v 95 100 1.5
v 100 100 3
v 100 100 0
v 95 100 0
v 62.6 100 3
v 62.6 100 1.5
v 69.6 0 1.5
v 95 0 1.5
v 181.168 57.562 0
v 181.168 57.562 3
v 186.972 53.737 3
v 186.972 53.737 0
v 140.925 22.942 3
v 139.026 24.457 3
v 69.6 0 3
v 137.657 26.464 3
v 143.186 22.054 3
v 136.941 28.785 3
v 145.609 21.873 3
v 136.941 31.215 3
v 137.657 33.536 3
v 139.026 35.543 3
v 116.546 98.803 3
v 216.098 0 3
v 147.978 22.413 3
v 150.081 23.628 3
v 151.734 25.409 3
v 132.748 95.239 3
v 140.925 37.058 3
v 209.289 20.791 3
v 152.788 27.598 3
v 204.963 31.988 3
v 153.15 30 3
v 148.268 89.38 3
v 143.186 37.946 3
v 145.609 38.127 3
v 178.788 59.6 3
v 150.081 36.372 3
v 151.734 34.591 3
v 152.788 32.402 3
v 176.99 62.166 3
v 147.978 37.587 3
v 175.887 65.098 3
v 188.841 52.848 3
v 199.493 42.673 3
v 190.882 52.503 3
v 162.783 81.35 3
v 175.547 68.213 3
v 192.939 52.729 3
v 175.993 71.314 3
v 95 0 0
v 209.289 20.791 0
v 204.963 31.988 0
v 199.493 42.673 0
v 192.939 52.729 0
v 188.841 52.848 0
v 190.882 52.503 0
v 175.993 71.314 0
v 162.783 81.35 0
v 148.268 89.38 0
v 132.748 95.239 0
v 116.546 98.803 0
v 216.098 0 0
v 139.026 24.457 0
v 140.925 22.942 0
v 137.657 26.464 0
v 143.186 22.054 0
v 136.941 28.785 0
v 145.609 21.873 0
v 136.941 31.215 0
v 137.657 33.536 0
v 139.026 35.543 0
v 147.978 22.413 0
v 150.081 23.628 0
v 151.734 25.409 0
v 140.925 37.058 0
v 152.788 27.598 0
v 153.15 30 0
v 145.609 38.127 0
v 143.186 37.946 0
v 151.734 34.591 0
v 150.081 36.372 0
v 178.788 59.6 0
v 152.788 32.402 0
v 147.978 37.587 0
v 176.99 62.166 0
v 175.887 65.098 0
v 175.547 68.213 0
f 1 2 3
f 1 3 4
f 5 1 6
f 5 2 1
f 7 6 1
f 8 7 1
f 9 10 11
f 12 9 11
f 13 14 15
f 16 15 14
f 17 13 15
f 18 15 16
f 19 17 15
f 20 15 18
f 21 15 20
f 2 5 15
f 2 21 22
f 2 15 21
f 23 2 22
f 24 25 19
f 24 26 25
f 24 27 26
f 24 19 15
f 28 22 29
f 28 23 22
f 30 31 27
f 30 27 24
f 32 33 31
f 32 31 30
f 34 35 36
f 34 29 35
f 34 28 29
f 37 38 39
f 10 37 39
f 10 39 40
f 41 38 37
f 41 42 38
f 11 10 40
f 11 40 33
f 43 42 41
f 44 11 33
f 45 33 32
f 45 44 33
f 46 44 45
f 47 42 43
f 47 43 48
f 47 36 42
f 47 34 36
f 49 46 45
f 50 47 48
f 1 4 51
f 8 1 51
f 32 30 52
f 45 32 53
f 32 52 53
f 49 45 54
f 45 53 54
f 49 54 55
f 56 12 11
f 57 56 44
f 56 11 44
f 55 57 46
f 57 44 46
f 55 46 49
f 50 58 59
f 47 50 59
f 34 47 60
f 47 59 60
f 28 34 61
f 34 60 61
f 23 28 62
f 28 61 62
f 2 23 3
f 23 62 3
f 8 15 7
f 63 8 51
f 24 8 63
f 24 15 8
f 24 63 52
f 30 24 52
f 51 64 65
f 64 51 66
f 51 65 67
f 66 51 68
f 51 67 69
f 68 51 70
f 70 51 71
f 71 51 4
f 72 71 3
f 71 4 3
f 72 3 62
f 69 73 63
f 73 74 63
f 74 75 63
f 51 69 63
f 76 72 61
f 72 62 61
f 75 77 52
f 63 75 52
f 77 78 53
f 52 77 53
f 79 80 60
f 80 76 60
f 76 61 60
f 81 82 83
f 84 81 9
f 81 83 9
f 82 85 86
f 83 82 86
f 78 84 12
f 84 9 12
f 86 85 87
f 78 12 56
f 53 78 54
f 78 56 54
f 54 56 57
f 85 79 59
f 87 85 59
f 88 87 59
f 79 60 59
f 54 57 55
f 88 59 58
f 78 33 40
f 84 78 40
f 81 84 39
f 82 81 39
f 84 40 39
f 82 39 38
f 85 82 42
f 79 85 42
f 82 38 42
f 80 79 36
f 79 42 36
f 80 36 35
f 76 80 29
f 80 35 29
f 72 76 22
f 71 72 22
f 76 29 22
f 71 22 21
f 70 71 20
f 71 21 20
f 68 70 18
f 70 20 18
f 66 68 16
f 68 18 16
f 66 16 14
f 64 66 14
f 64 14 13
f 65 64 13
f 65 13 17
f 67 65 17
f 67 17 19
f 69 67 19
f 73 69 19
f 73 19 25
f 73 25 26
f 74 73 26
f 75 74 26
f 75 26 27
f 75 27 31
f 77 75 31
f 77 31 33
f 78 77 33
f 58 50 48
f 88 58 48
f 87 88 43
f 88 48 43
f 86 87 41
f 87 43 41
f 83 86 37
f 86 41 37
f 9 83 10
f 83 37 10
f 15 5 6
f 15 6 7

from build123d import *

# Parameters (mm, degrees)
F1_DEPTH  = 3
F3_DEPTH  = 25
F4_R      = 5
F5_R      = 11.15
F5_R_2    = 2.65
F6_DEPTH  = 25
F7_W      = 78
F7_H      = 55.5
F7_R      = 2
F8_DEPTH  = 25
F9_R      = 8.15
F10_DEPTH = 25
F12_W     = 307.7535755343
F12_H     = 117.255145081
F13_DEPTH = 25
F14_W     = 20
F14_H     = 100
F15_DEPTH = 1.5
F17_DEPTH = 1.5
F19_DEPTH = 25


with BuildPart() as f1:
    # F0 (on Top) → F1 (new body)
    with BuildSketch(Plane.XY):
        with BuildLine():
            Line((-197.8147600734, 20.7911690818), (-202.2340594865, 0))
            Line((-202.2340594865, 0), (216.0975214603, 0))
            Line((216.0975214603, 0), (209.2885731253, 20.7911690818))
            ThreePointArc((209.2885731253, 20.7911690818), (167.4870934164, 78.1154778874), (100, 100))
            Line((100, 100), (-100, 100))
            ThreePointArc((-100, 100), (-162.932039105, 77.7145961457), (-197.8147600734, 20.7911690818))
        make_face()
    extrude(amount=F1_DEPTH)

    # F2 (on face) → F3 (cut)
    with BuildSketch(Plane.XY.offset(3)):
        with BuildLine():
            ThreePointArc((1.5842979518, 0), (9.4530988092, 4.1693984068), (12.6, 12.5))
            ThreePointArc((12.6, 12.5), (12.2192388124, 15.5741182224), (11.0999678023, 18.4624420155))
            ThreePointArc((11.0999678023, 18.4624420155), (0, 25.1), (-11.0999678023, 18.4624420155))
            ThreePointArc((-11.0999678023, 18.4624420155), (-11.1999147641, 6.7274867453), (-1.5842979518, 0))
            Line((-1.5842979518, 0), (1.5842979518, 0))
        make_face()
        with BuildLine():
            ThreePointArc((11.0999678023, 18.4624420155), (12.2192388124, 15.5741182224), (12.6, 12.5))
            ThreePointArc((12.6, 12.5), (9.4530988092, 4.1693984068), (1.5842979518, 0))
            Line((1.5842979518, 0), (21.7592636698, 0))
            Line((21.7592636698, 0), (11.0999678023, 18.4624420155))
        make_face()
        with BuildLine():
            ThreePointArc((-1.5842979518, 0), (0, -0.1), (1.5842979518, 0))
            Line((1.5842979518, 0), (-1.5842979518, 0))
        make_face()
        with BuildLine():
            ThreePointArc((-1.5842979518, 0), (-11.1999147641, 6.7274867453), (-11.0999678023, 18.4624420155))
            Line((-11.0999678023, 18.4624420155), (-21.7592636698, 0))
            Line((-21.7592636698, 0), (-1.5842979518, 0))
        make_face()
    extrude(amount=-F3_DEPTH, mode=Mode.SUBTRACT)

    # F4
    f4_edges = [f1.edges().sort_by_distance(p)[0] for p in [
        (-21.759264, 0, 1.5),
        (21.759264, 0, 1.5),
    ]]
    fillet(f4_edges, radius=F4_R)

    # F5 (on face) → F6 (cut)
    with BuildSketch(Plane.XY.offset(3)):
        Polygon((-145, 38.9489291724), (-152.75, 34.4744645862), (-152.75, 25.5255354138), (-145, 21.0510708276), (-137.25, 25.5255354138), (-137.25, 34.4744645862), align=None)
        with Locations((-115, 30)):
            Circle(F5_R)
        with Locations((-115, 60)):
            Circle(F5_R_2)
        with Locations((-145, 60)):
            Circle(F5_R_2)
    extrude(amount=-F6_DEPTH, mode=Mode.SUBTRACT)

    # F7 (on face) → F8 (cut)
    with BuildSketch(Plane.XY.offset(3)):
        with Locations((0, 57.75)):
            Rectangle(F7_W, F7_H)
        with Locations((-42.6313167033, 28.25)):
            Circle(F7_R)
        with Locations((-42.6313167033, 87.25)):
            Circle(F7_R)
        with Locations((42.3686832967, 87.25)):
            Circle(F7_R)
        with Locations((42.3686832967, 28.25)):
            Circle(F7_R)
    extrude(amount=-F8_DEPTH, mode=Mode.SUBTRACT)

    # F9 (on face) → F10 (cut)
    with BuildSketch(Plane.XY.offset(3)):
        with Locations((145, 30)):
            Circle(F9_R)
    extrude(amount=-F10_DEPTH, mode=Mode.SUBTRACT)

    # F12 (on face) → F13 (cut)
    with BuildSketch(Plane.XY.offset(3)):
        with Locations((-78.8767877671, 58.6275725405)):
            Rectangle(F12_W, F12_H)
    extrude(amount=-F13_DEPTH, mode=Mode.SUBTRACT)

    # F14 (on face) → F15 (cut)
    with BuildSketch(Plane(origin=(0, 0, 0), x_dir=(1, 0, 0), z_dir=(0, 0, -1))):
        with Locations((85, -50)):
            Rectangle(F14_W, F14_H)
    extrude(amount=-F15_DEPTH, mode=Mode.SUBTRACT)

    # F16 (on face) → F17 (join)
    with BuildSketch(Plane.XY.offset(3)):
        Polygon((75, 0), (75, 100), (62.6, 100), (69.6, 0), align=None)
    extrude(amount=-F17_DEPTH)

    # F18 (on face) → F19 (cut)
    with BuildSketch(Plane.XY.offset(3)):
        with BuildLine():
            ThreePointArc((198.5084757314, 61.1607791283), (200.0253825343, 64.4319411082), (200.5454428122, 68))
            ThreePointArc((200.5454428122, 68), (182.1177116525, 79.0050898814), (181.1675222846, 57.562365727))
            ThreePointArc((181.1675222846, 57.562365727), (182.9183296915, 56.599881095), (184.8001189484, 55.9286341693))
            ThreePointArc((184.8001189484, 55.9286341693), (188.4244577932, 67.0069708263), (198.5084757314, 61.1607791283))
        make_face()
        with BuildLine():
            ThreePointArc((184.8001189484, 55.9286341693), (182.9183296915, 56.599881095), (181.1675222846, 57.562365727))
            Line((181.1675222846, 57.562365727), (186.9720950966, 53.7374194362))
            ThreePointArc((186.9720950966, 53.7374194362), (185.772214529, 54.7201342708), (184.8001189484, 55.9286341693))
        make_face()
        with BuildLine():
            ThreePointArc((198.5988474131, 60), (198.5762203605, 60.5821458635), (198.5084757314, 61.1607791283))
            ThreePointArc((198.5084757314, 61.1607791283), (192.5027588454, 56.3217152895), (184.8001189484, 55.9286341693))
            ThreePointArc((184.8001189484, 55.9286341693), (185.772214529, 54.7201342708), (186.9720950966, 53.7374194362))
            ThreePointArc((186.9720950966, 53.7374194362), (194.655486109, 53.3969460712), (198.5988474131, 60))
        make_face()
        with BuildLine():
            ThreePointArc((184.8001189484, 55.9286341693), (192.5027588454, 56.3217152895), (198.5084757314, 61.1607791283))
            ThreePointArc((198.5084757314, 61.1607791283), (188.4244577932, 67.0069708263), (184.8001189484, 55.9286341693))
        make_face()
    extrude(amount=-F19_DEPTH, mode=Mode.SUBTRACT)


solid = f1.part
